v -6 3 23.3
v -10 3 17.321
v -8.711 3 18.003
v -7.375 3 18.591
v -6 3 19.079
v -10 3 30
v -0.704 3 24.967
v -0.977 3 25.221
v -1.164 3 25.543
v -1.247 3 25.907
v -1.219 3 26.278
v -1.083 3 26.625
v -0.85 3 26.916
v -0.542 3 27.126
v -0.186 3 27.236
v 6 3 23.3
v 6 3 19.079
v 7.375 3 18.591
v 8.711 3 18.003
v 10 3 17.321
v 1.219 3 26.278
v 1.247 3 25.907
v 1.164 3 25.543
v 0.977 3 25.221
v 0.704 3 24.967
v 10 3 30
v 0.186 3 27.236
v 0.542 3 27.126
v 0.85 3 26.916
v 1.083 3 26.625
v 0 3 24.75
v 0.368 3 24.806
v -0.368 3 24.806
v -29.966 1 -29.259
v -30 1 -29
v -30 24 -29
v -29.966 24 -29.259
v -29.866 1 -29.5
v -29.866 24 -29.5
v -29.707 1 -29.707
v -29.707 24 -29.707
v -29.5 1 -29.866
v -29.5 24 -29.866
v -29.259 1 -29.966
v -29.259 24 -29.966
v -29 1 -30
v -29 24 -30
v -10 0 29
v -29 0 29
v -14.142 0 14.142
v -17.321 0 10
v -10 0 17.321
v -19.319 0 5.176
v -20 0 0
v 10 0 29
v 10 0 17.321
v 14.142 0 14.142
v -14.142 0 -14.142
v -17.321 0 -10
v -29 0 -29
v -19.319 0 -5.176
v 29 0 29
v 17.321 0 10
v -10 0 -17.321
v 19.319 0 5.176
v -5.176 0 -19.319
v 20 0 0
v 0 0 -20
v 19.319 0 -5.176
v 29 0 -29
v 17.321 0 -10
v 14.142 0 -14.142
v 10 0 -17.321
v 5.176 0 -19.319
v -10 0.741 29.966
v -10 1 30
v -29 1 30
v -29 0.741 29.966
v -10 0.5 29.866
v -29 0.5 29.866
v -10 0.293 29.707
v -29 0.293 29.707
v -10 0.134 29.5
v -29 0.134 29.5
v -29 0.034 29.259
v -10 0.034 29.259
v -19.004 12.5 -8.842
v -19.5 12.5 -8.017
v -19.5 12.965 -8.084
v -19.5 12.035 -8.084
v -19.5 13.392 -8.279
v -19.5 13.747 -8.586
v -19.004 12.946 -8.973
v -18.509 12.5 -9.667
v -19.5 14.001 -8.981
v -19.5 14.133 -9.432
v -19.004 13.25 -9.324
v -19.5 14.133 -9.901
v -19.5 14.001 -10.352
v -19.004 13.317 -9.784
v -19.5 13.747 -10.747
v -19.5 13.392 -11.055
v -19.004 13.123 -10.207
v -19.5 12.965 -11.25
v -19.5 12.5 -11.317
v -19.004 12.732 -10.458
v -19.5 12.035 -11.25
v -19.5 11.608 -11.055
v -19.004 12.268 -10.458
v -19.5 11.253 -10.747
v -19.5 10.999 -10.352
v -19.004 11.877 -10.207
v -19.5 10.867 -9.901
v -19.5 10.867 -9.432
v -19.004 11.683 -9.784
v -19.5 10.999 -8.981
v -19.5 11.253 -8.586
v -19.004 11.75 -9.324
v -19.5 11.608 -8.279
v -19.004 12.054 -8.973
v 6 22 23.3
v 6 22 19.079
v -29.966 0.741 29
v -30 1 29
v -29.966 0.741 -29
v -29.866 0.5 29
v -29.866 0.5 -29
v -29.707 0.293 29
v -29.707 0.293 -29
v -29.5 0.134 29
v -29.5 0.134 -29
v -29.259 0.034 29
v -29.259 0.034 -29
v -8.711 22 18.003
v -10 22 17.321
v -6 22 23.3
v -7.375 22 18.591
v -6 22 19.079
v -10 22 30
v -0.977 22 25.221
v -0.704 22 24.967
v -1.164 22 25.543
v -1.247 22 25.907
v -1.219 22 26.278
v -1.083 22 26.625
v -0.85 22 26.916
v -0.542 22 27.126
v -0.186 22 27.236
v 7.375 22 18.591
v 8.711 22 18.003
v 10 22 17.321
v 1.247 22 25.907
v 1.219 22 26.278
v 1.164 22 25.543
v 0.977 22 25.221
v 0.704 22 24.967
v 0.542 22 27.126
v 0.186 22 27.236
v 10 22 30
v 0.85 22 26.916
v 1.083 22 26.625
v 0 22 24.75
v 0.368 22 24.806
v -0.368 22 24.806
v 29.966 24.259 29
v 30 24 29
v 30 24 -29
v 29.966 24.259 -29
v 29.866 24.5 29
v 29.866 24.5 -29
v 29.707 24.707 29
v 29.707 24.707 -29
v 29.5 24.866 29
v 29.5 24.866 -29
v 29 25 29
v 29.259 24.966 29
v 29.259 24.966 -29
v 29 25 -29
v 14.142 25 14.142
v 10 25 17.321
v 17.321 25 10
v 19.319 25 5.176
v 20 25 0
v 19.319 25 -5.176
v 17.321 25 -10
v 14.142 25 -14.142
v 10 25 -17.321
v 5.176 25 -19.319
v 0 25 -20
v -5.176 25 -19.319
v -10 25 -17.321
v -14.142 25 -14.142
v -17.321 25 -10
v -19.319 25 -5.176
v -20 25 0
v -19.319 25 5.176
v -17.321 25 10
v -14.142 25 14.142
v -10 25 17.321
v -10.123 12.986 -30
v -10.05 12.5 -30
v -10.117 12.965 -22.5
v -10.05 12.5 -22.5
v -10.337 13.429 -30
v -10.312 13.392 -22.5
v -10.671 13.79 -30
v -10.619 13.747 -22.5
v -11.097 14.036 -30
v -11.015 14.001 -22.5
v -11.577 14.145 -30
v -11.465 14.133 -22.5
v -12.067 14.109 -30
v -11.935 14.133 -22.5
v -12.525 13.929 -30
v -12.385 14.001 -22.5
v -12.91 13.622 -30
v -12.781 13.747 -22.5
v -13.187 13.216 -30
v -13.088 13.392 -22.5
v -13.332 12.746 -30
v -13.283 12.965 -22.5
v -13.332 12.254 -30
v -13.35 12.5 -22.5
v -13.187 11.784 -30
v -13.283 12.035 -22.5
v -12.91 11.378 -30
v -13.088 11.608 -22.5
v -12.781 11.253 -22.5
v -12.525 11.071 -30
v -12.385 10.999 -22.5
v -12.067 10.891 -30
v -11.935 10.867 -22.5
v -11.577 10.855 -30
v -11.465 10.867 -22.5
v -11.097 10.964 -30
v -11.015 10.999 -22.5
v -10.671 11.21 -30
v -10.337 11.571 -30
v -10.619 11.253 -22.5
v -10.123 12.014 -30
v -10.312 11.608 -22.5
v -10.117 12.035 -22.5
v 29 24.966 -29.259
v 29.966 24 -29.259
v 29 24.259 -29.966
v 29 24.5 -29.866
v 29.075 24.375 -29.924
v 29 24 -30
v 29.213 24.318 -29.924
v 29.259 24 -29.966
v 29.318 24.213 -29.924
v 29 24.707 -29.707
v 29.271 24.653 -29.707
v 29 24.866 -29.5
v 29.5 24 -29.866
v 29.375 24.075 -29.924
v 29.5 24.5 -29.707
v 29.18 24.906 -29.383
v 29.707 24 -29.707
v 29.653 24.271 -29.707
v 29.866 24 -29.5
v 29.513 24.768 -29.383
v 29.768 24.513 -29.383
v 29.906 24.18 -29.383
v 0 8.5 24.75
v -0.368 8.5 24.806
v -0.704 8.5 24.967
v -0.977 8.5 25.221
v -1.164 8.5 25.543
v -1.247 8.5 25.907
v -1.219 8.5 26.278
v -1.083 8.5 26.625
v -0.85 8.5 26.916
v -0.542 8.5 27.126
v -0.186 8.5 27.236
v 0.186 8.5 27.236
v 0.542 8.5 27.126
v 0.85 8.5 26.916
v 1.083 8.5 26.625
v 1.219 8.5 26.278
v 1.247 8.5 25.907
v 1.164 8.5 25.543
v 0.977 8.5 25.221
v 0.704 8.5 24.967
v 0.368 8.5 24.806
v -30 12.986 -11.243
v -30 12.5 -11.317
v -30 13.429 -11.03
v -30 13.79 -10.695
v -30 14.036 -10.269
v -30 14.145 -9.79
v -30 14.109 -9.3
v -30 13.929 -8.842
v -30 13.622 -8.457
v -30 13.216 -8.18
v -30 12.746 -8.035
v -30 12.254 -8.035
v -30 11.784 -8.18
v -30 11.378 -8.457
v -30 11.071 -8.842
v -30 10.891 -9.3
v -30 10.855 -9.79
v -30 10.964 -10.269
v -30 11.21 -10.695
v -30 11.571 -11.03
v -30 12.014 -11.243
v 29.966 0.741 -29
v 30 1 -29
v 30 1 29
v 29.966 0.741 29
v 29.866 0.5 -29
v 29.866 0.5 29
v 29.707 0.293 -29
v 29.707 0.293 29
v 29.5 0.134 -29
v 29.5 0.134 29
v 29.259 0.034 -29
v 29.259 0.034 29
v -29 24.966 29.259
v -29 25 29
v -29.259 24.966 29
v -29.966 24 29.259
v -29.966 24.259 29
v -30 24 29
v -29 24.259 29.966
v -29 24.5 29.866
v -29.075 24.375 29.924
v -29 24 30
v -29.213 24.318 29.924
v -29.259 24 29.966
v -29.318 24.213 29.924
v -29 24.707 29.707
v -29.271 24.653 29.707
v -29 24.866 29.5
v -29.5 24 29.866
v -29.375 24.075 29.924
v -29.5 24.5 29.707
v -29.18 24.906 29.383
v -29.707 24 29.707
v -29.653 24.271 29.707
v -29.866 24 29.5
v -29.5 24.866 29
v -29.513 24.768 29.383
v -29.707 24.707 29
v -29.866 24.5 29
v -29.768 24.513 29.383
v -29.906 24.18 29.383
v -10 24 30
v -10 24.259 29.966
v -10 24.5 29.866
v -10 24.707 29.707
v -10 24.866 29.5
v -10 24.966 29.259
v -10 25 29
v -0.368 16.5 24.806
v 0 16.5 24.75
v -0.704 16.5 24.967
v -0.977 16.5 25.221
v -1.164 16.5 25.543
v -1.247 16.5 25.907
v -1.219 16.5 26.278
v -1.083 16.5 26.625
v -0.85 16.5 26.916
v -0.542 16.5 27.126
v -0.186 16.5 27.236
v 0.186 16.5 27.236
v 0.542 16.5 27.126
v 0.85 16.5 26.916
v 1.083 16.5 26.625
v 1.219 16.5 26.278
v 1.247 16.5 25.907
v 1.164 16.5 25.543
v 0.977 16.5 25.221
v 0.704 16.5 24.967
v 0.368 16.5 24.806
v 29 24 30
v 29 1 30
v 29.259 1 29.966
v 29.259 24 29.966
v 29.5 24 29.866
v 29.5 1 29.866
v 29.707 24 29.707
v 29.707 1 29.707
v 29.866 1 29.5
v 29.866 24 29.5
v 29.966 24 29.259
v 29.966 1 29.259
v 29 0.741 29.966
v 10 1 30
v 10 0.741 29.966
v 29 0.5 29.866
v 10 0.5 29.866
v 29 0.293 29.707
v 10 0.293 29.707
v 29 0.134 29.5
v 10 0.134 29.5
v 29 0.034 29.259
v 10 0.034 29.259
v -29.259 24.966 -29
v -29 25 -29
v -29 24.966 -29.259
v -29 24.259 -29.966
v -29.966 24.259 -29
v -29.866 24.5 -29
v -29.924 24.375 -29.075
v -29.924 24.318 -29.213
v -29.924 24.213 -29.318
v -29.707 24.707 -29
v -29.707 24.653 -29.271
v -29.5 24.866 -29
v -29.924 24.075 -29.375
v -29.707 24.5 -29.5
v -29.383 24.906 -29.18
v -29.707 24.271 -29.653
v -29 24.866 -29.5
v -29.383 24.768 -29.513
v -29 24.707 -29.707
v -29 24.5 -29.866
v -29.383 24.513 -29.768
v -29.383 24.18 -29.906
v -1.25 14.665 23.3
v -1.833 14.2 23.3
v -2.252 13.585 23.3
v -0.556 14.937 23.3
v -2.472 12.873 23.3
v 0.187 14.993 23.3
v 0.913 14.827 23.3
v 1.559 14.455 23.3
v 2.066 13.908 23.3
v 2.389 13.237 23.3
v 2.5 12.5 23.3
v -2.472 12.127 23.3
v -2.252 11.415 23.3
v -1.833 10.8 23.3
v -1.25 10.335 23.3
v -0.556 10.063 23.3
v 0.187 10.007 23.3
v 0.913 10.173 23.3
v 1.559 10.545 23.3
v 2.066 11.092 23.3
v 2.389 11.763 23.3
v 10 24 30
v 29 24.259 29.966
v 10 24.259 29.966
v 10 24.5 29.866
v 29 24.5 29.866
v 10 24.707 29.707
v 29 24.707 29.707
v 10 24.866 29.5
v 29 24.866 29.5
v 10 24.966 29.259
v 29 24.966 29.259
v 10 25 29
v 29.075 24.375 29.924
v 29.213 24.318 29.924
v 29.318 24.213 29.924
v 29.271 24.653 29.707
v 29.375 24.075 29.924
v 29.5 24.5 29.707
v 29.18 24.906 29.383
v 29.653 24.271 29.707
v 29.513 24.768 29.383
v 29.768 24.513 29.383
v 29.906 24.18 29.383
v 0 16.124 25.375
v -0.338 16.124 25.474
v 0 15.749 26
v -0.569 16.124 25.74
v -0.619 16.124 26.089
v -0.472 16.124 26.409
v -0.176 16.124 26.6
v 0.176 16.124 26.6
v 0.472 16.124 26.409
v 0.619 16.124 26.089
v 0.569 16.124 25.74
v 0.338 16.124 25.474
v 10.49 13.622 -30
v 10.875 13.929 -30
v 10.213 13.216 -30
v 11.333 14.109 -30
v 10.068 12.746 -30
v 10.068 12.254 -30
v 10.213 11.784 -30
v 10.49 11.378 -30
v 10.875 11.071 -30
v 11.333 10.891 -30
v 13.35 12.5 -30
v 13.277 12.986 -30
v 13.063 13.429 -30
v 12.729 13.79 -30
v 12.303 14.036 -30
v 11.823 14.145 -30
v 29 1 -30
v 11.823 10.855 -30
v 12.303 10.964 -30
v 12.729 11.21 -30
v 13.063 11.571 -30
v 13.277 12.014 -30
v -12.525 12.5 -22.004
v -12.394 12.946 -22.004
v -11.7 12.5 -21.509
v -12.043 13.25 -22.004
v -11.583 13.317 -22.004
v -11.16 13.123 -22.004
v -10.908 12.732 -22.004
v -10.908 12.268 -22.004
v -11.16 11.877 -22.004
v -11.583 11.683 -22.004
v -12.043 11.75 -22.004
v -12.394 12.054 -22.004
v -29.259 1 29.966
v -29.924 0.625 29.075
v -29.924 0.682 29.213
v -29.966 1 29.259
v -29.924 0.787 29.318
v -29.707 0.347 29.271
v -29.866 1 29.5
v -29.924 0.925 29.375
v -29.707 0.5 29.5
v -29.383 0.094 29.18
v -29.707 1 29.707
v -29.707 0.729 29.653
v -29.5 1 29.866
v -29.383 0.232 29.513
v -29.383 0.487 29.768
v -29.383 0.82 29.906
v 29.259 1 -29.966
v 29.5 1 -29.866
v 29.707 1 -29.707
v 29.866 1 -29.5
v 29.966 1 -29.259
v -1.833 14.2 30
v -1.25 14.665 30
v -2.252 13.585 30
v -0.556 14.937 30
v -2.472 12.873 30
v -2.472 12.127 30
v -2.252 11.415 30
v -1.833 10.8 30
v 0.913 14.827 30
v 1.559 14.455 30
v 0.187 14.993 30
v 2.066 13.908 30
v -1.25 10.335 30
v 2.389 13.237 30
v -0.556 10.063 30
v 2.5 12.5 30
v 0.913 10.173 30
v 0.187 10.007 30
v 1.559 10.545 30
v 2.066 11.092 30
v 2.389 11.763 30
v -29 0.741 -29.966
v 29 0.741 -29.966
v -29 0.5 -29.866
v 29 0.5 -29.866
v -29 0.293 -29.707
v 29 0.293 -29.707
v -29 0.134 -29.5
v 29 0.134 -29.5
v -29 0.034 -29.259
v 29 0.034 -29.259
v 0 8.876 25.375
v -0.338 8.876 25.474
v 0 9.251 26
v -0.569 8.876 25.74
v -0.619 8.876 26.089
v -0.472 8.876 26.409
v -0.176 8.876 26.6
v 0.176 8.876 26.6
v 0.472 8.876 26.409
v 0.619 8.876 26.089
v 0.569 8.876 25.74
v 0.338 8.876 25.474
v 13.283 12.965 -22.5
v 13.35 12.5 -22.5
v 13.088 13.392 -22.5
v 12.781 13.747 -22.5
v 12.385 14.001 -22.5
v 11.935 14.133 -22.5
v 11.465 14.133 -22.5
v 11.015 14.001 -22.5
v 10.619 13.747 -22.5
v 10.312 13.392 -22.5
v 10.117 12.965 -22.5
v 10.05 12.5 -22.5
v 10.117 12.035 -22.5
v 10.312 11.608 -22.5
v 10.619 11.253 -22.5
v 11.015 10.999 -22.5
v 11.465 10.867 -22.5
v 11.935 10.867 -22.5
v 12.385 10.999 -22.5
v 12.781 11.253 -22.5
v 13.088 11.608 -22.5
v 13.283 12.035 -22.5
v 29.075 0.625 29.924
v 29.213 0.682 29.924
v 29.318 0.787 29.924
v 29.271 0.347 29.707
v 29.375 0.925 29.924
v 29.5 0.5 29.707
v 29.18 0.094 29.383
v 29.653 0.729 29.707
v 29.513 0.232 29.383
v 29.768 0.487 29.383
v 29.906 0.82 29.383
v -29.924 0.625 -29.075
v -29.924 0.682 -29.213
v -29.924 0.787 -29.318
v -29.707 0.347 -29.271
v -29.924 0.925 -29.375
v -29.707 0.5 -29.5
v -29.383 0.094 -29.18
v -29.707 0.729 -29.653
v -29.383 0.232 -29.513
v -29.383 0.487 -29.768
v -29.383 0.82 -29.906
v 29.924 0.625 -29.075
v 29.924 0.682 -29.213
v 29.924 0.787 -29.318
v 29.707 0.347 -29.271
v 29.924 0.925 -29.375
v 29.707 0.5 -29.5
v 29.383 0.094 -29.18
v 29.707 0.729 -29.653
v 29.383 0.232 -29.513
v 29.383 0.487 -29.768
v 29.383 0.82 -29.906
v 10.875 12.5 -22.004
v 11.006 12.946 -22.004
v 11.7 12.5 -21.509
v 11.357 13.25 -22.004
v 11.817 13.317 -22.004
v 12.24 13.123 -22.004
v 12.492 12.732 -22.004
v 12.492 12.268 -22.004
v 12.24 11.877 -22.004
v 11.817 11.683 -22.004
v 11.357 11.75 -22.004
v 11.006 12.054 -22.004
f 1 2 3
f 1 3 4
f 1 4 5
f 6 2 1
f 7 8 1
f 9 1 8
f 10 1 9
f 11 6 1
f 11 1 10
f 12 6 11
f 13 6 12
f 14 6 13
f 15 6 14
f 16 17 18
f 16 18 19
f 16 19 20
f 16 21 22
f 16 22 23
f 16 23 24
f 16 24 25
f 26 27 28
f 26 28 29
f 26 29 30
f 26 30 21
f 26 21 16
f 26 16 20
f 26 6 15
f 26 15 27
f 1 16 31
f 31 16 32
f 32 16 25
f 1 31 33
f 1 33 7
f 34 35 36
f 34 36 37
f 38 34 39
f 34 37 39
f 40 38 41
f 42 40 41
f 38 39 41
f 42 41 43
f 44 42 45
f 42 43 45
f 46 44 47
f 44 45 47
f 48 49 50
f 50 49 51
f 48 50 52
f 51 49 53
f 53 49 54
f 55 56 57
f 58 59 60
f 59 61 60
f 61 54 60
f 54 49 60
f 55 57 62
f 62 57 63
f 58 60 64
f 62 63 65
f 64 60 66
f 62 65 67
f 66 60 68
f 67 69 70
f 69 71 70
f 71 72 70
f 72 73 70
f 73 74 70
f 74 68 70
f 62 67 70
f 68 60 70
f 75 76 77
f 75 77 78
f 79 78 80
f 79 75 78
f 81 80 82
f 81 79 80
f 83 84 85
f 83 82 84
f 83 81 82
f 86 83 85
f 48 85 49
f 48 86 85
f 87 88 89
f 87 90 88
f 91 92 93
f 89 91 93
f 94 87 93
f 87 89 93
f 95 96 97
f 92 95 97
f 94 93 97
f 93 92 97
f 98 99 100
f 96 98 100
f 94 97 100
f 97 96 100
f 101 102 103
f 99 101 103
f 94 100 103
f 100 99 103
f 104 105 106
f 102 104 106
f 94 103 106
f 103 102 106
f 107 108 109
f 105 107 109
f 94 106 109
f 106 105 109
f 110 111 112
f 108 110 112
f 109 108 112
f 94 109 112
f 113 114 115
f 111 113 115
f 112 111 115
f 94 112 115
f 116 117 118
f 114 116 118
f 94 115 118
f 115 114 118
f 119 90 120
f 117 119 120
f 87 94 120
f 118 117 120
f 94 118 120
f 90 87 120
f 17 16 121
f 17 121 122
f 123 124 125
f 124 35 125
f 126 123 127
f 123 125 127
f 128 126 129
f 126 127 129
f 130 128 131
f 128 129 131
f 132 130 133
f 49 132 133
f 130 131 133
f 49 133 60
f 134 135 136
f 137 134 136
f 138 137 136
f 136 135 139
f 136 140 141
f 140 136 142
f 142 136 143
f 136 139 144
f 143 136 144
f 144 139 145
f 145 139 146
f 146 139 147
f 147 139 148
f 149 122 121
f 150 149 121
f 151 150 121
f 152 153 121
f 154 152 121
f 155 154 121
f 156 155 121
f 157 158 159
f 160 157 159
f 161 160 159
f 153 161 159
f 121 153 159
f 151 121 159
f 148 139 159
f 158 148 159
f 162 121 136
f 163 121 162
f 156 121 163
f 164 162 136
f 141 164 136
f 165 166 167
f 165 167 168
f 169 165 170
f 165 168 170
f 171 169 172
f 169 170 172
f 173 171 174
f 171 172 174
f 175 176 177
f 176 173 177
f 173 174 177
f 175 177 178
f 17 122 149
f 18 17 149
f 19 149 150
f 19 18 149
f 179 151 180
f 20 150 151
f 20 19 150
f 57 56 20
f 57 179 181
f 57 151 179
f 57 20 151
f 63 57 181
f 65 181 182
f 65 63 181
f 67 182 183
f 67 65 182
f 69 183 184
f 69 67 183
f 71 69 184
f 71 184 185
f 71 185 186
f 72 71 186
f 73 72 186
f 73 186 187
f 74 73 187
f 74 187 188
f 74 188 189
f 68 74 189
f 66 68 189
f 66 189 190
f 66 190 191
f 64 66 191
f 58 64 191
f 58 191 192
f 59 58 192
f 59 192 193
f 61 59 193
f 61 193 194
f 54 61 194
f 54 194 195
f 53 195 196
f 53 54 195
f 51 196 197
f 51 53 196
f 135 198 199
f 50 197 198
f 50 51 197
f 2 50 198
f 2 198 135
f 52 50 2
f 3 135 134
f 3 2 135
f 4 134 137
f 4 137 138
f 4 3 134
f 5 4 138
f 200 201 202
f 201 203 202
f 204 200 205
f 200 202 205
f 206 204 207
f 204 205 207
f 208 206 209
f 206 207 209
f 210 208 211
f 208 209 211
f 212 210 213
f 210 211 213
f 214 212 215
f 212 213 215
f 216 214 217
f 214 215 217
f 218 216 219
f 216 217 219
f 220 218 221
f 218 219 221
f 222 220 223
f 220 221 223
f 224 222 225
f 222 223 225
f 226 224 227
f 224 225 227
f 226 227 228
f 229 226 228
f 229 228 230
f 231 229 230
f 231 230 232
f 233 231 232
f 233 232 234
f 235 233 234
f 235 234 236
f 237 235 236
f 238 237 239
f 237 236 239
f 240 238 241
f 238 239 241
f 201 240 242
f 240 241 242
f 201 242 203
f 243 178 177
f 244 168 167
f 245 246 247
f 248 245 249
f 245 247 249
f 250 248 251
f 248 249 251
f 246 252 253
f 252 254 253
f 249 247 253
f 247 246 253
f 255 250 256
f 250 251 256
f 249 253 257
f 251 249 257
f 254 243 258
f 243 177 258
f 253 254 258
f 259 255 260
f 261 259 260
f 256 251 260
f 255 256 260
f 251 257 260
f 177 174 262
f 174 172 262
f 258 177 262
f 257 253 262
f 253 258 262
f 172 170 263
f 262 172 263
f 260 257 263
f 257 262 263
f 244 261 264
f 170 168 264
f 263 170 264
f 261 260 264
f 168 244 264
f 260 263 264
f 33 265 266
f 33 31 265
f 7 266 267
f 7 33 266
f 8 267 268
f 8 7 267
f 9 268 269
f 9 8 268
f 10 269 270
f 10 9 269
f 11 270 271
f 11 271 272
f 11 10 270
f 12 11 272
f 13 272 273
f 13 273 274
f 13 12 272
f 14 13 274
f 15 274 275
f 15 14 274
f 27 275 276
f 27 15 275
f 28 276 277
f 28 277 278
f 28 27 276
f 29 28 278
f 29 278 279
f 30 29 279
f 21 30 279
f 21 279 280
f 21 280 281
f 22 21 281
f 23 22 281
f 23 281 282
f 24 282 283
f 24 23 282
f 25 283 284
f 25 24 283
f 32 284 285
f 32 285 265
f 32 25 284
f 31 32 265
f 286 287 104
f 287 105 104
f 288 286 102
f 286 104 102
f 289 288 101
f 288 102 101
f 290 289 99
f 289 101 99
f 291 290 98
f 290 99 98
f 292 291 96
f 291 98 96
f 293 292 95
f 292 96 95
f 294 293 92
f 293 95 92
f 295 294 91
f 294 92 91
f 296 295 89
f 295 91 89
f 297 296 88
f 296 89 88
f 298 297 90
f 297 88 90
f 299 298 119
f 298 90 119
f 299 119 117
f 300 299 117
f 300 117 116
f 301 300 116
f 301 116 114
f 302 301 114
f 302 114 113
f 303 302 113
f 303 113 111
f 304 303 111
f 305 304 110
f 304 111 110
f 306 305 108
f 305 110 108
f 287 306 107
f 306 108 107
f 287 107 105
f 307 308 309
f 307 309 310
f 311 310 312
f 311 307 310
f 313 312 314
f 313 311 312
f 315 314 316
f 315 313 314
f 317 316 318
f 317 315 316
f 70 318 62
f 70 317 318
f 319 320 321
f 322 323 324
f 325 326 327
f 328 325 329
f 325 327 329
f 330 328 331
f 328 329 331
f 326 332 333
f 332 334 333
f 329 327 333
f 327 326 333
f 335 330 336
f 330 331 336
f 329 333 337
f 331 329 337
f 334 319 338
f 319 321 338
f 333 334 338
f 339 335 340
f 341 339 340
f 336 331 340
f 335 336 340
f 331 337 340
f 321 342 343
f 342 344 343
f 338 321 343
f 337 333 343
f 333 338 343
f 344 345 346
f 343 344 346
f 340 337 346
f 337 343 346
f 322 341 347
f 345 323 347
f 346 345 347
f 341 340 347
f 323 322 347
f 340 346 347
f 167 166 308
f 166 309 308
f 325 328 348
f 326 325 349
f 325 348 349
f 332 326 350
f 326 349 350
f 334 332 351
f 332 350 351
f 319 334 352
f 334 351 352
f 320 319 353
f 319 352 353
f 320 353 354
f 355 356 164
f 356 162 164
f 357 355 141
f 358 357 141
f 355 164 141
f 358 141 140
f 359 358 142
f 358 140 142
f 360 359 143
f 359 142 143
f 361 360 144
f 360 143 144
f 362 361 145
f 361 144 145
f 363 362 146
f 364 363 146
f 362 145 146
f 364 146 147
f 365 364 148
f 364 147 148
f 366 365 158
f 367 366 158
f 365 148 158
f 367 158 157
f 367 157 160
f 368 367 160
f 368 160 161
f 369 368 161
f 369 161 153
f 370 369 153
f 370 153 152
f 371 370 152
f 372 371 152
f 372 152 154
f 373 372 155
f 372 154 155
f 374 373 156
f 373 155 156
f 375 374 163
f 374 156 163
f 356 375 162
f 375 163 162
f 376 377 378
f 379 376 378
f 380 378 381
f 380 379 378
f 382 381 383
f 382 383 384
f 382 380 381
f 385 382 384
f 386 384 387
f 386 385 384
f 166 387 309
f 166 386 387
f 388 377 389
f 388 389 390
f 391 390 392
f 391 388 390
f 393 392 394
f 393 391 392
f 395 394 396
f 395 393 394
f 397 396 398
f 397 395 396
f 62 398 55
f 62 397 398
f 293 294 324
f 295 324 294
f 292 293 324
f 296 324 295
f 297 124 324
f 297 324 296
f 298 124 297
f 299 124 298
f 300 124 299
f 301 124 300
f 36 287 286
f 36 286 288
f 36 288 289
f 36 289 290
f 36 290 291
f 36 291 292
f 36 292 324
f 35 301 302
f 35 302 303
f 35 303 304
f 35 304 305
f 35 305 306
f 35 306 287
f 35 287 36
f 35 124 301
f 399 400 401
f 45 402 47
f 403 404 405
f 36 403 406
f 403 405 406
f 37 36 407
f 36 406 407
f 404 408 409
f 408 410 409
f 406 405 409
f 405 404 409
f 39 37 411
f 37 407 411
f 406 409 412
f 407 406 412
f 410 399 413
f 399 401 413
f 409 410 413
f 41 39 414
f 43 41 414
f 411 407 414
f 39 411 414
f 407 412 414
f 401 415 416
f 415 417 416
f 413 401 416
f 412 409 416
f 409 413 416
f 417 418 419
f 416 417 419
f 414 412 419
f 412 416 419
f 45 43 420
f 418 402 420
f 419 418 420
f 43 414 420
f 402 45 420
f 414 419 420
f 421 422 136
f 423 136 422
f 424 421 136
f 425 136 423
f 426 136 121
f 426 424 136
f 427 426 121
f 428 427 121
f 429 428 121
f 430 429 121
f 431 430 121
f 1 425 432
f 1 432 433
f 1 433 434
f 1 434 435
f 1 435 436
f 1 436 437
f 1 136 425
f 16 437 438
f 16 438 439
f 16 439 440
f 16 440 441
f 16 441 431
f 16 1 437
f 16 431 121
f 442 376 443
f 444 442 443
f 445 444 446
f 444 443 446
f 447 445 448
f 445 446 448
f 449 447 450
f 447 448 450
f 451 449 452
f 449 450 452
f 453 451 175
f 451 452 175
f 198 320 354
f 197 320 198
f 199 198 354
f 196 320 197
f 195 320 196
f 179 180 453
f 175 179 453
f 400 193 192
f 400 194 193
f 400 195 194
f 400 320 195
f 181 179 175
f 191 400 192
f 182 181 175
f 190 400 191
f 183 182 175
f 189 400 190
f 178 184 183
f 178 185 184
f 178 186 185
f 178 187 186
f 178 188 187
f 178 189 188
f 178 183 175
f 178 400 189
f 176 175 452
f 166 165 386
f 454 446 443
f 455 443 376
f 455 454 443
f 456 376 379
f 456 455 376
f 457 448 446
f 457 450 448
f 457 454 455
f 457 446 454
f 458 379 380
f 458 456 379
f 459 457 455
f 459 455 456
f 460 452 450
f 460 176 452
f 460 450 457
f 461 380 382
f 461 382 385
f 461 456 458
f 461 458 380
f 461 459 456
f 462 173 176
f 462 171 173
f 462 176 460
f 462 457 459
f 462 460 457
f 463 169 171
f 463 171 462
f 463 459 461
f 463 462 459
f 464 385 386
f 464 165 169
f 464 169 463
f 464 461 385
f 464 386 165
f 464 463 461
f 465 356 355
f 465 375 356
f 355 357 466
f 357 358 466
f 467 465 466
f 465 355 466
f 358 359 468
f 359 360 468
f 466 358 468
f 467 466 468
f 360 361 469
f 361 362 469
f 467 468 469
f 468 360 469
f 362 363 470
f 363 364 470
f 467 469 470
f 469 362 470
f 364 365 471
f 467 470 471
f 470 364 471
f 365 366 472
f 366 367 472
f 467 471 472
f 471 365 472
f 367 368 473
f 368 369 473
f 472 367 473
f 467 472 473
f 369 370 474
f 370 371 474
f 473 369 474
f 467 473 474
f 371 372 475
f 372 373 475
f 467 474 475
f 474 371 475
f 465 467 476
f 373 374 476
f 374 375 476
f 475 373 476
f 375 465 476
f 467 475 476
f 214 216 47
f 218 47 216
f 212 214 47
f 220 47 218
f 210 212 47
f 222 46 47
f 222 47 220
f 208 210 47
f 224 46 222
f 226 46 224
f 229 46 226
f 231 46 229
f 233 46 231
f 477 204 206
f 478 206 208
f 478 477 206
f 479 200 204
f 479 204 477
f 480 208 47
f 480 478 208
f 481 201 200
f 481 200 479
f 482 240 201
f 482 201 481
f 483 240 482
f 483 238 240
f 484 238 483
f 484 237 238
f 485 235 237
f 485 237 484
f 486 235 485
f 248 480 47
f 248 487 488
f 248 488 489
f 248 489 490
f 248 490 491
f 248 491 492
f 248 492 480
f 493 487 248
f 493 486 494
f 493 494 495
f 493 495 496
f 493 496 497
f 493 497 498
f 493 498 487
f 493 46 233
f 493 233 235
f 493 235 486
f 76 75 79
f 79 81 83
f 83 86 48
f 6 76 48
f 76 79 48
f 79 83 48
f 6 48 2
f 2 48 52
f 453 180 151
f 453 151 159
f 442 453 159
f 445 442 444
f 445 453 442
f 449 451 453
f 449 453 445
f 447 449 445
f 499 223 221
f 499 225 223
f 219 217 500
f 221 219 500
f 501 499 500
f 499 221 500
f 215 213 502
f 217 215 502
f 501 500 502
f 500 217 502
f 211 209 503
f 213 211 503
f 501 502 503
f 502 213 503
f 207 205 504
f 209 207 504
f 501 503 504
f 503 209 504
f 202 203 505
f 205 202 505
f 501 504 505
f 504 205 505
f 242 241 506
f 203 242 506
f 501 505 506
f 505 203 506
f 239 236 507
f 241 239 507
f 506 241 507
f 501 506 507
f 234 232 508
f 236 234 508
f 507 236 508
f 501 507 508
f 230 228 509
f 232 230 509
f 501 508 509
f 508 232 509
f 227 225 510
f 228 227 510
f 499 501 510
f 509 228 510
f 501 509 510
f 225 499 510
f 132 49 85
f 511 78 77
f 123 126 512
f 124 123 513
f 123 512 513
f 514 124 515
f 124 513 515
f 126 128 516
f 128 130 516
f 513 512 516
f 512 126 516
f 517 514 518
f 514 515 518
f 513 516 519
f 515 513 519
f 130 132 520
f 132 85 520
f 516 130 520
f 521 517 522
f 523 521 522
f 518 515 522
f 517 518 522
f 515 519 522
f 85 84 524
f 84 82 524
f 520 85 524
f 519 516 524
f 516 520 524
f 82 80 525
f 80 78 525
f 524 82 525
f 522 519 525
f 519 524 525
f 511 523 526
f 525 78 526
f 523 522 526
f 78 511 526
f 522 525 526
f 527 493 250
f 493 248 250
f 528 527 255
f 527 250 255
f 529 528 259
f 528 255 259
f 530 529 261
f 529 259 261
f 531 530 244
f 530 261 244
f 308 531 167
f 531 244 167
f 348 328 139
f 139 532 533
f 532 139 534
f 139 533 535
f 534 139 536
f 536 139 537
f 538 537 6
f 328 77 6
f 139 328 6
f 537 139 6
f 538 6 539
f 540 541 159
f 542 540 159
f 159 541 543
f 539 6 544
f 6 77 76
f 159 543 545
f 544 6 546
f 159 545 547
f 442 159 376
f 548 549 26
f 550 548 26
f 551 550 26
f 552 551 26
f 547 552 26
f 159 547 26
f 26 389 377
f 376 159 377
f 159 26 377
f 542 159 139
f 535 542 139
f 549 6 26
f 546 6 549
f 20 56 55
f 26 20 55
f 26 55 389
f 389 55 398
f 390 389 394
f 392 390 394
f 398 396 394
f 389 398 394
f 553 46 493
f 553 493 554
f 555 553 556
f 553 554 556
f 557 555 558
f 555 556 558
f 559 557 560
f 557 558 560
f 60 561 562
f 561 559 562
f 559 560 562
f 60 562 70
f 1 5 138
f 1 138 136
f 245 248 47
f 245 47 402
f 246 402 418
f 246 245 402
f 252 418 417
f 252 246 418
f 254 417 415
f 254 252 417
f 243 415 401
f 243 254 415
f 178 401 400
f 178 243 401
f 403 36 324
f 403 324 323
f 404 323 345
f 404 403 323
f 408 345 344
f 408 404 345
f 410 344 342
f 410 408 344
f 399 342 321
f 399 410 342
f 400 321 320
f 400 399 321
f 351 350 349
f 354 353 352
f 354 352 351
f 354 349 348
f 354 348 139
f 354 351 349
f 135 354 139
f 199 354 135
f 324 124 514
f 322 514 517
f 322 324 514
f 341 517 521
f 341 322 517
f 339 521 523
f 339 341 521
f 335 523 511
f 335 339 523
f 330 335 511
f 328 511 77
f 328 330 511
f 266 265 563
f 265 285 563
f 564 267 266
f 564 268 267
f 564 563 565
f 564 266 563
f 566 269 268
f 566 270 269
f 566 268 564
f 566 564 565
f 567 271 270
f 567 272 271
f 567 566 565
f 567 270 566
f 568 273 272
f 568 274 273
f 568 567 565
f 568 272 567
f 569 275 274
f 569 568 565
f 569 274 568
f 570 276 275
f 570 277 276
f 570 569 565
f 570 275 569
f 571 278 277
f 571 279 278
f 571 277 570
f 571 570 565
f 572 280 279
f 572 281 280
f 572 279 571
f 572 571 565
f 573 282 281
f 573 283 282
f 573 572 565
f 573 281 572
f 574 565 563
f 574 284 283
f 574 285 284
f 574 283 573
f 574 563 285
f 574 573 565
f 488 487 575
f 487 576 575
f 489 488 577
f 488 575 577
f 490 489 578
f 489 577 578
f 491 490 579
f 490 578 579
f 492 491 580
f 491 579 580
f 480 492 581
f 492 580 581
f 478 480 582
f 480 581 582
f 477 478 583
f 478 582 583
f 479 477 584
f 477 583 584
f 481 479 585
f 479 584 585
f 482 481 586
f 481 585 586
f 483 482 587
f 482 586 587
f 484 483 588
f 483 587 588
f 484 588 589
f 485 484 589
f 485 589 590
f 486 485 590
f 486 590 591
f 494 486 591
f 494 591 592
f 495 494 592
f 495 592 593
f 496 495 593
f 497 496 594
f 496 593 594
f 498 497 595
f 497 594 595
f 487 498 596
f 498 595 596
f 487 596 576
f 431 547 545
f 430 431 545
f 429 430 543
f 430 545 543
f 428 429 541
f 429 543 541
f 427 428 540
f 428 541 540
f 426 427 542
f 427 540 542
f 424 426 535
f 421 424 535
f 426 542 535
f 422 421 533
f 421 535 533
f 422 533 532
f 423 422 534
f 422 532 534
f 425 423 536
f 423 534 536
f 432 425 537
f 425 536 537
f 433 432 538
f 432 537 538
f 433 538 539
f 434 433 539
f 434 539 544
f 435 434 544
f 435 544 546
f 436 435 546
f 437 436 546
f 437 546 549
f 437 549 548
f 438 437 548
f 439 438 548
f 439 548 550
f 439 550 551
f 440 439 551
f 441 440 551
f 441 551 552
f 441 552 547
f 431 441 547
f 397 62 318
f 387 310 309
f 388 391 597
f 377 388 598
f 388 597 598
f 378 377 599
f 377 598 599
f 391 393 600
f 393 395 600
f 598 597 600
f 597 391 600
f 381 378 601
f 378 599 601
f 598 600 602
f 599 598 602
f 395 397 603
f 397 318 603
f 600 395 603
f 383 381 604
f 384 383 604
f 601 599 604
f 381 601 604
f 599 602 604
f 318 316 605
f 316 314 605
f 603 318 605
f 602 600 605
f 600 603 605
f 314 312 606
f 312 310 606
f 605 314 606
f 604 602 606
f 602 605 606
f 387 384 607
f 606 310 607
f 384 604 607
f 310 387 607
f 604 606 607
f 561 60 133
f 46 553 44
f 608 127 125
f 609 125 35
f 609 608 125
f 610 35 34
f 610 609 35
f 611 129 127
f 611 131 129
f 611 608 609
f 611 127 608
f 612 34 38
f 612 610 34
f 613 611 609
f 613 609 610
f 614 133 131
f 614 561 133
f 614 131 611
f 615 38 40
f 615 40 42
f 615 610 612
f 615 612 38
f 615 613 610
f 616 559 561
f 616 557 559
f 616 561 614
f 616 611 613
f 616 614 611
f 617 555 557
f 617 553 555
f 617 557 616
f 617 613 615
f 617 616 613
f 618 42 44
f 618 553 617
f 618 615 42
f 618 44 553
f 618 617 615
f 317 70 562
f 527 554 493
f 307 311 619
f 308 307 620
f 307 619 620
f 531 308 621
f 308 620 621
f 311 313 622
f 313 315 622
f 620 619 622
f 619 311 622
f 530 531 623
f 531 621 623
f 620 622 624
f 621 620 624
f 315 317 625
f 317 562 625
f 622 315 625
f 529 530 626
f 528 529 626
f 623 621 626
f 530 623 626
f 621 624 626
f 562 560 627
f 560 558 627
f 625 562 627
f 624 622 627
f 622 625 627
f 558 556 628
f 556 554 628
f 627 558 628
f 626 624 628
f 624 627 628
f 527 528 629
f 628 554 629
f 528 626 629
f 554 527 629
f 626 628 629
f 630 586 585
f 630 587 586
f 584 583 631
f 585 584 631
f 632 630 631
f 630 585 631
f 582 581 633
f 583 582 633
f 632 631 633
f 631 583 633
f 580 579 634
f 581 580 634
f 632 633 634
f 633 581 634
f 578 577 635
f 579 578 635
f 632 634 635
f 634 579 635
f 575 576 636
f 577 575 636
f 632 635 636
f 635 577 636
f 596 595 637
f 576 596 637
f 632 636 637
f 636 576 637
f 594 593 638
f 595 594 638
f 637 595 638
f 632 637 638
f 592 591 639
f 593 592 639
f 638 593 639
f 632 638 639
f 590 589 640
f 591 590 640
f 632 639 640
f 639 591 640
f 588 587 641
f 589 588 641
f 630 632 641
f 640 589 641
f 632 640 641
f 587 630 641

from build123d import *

# Parameters (mm, degrees)
ESQUISSE1_W             = 60
ESQUISSE1_H             = 60
ESQUISSE1_R             = 20
BOSS_EXTRU_1_DEPTH      = 25
CONG_1_R                = 1
TROU_TARAUD_M61_REACH   = 73.589
TROU_TARAUD_M61_BORE_R  = 2.5
TROU_TARAUD_M41_D       = 3.3
TROU_TARAUD_M41_DEPTH   = 7.5
TROU_TARAUD_M41_TIP     = 0.991420021
TROU_TARAUD_M42_D       = 3.3
TROU_TARAUD_M42_DEPTH   = 10.5
TROU_TARAUD_M42_TIP     = 0.991420021
ENL_V_MAT_EXTRU_1_REACH = 51.244
ENL_V_MAT_EXTRU_2_DEPTH = 3


with BuildPart() as part:
    # Esquisse1 → Boss.-Extru.1 (new body)
    with BuildSketch(Plane(origin=(0, 0, 0), x_dir=(1, 0, 0), z_dir=(0, 1, 0))):
        Rectangle(ESQUISSE1_W, ESQUISSE1_H)
        with Locations(Location((0, 0, 0), (0, 0, 270))):
            Circle(ESQUISSE1_R, mode=Mode.SUBTRACT)
    extrude(amount=BOSS_EXTRU_1_DEPTH)

    # Congé1
    cong_1_edges = [part.edges().sort_by_distance(p)[0] for p in [
        (30, 25, 0),
        (0, 25, -30),
        (-30, 25, 0),
        (0, 0, -30),
        (30, 0, 0),
        (0, 0, 30),
        (-30, 0, 0),
        (0, 25, 30),
        (-30, 12.5, -30),
        (30, 12.5, -30),
        (30, 12.5, 30),
        (-30, 12.5, 30),
    ]]
    fillet(cong_1_edges, radius=CONG_1_R)

    # Trou taraudé M61 bore → Trou taraudé M61 (cut, up to next)
    with BuildSketch(Plane.XY.offset(30), mode=Mode.PRIVATE) as trou_taraud_m61_sk1:
        with Locations((0, 12.5)):
            Circle(TROU_TARAUD_M61_BORE_R)
    trou_taraud_m61_tool1 = extrude(trou_taraud_m61_sk1.sketch, amount=-TROU_TARAUD_M61_REACH, mode=Mode.PRIVATE) & part.part
    add(trou_taraud_m61_tool1.solids().sort_by_distance((0, 12.5, 30))[0], mode=Mode.SUBTRACT)

    # Trou taraudé M41
    with Locations(Plane(origin=(0, 0, -30), x_dir=(-1, 0, 0), z_dir=(0, 0, -1))):
        with Locations((11.7, 12.5), (-11.7, 12.5)):
            Hole(TROU_TARAUD_M41_D / 2, depth=TROU_TARAUD_M41_DEPTH)
            with Locations((0, 0, -(TROU_TARAUD_M41_DEPTH + TROU_TARAUD_M41_TIP / 2))):  # 118° drill point
                Cone(0, TROU_TARAUD_M41_D / 2, TROU_TARAUD_M41_TIP, mode=Mode.SUBTRACT)

    # Trou taraudé M42
    with Locations(Plane.ZY.offset(30)):
        with Locations((-9.666666667, 12.5)):
            Hole(TROU_TARAUD_M42_D / 2, depth=TROU_TARAUD_M42_DEPTH)
            with Locations((0, 0, -(TROU_TARAUD_M42_DEPTH + TROU_TARAUD_M42_TIP / 2))):  # 118° drill point
                Cone(0, TROU_TARAUD_M42_D / 2, TROU_TARAUD_M42_TIP, mode=Mode.SUBTRACT)

    # Esquisse10 → Enlèv. mat.-Extru.1 (cut, up to next)
    with BuildSketch(Plane.XZ, mode=Mode.PRIVATE) as enl_v_mat_extru_1_sk1:
        with BuildLine():
            Line((-6, 19.078784028), (-6, 23.3))
            Line((-6, 23.3), (6, 23.3))
            Line((6, 23.3), (6, 19.078784028))
            ThreePointArc((6, 19.078784028), (0, 20), (-6, 19.078784028))
        make_face()
    enl_v_mat_extru_1_tool1 = extrude(enl_v_mat_extru_1_sk1.sketch, amount=-ENL_V_MAT_EXTRU_1_REACH, mode=Mode.PRIVATE) & part.part
    add(enl_v_mat_extru_1_tool1.solids().sort_by_distance((0, 0, 21.487514))[0], mode=Mode.SUBTRACT)

    # Esquisse11 → Enlèv. mat.-Extru.2 (cut)
    with BuildSketch(Plane.XZ):
        with BuildLine():
            Line((-10, 30), (-10, 17.320508076))
            ThreePointArc((-10, 17.320508076), (0, 20), (10, 17.320508076))
            Line((10, 17.320508076), (10, 30))
            Line((10, 30), (-10, 30))
        make_face()
    enl_v_mat_extru_2 = extrude(amount=-ENL_V_MAT_EXTRU_2_DEPTH, mode=Mode.SUBTRACT)

    # Esquisse13 → Trou taraudé M31 (revolve, cut)
    with BuildSketch(Plane(origin=(0, 3, 26), x_dir=(0, 0, -1), z_dir=(1, 0, 0))):
        Polygon((0, 0), (0, 6.251075774), (1.25, 5.5), (1.25, 0), align=None)
    trou_taraud_m31 = revolve(axis=Axis((0, -3.35, 26), (0, 1, 0)), mode=Mode.SUBTRACT)

    # Symétrie1: Enlèv. mat.-Extru.2, Trou taraudé M31 across plane
    add(enl_v_mat_extru_2.mirror(Plane(origin=(0, 12.5, 0), x_dir=(0, 0, 1), z_dir=(0, -1, 0))), mode=Mode.SUBTRACT)
    add(trou_taraud_m31.mirror(Plane(origin=(0, 12.5, 0), x_dir=(0, 0, 1), z_dir=(0, -1, 0))), mode=Mode.SUBTRACT)


solid = part.part
